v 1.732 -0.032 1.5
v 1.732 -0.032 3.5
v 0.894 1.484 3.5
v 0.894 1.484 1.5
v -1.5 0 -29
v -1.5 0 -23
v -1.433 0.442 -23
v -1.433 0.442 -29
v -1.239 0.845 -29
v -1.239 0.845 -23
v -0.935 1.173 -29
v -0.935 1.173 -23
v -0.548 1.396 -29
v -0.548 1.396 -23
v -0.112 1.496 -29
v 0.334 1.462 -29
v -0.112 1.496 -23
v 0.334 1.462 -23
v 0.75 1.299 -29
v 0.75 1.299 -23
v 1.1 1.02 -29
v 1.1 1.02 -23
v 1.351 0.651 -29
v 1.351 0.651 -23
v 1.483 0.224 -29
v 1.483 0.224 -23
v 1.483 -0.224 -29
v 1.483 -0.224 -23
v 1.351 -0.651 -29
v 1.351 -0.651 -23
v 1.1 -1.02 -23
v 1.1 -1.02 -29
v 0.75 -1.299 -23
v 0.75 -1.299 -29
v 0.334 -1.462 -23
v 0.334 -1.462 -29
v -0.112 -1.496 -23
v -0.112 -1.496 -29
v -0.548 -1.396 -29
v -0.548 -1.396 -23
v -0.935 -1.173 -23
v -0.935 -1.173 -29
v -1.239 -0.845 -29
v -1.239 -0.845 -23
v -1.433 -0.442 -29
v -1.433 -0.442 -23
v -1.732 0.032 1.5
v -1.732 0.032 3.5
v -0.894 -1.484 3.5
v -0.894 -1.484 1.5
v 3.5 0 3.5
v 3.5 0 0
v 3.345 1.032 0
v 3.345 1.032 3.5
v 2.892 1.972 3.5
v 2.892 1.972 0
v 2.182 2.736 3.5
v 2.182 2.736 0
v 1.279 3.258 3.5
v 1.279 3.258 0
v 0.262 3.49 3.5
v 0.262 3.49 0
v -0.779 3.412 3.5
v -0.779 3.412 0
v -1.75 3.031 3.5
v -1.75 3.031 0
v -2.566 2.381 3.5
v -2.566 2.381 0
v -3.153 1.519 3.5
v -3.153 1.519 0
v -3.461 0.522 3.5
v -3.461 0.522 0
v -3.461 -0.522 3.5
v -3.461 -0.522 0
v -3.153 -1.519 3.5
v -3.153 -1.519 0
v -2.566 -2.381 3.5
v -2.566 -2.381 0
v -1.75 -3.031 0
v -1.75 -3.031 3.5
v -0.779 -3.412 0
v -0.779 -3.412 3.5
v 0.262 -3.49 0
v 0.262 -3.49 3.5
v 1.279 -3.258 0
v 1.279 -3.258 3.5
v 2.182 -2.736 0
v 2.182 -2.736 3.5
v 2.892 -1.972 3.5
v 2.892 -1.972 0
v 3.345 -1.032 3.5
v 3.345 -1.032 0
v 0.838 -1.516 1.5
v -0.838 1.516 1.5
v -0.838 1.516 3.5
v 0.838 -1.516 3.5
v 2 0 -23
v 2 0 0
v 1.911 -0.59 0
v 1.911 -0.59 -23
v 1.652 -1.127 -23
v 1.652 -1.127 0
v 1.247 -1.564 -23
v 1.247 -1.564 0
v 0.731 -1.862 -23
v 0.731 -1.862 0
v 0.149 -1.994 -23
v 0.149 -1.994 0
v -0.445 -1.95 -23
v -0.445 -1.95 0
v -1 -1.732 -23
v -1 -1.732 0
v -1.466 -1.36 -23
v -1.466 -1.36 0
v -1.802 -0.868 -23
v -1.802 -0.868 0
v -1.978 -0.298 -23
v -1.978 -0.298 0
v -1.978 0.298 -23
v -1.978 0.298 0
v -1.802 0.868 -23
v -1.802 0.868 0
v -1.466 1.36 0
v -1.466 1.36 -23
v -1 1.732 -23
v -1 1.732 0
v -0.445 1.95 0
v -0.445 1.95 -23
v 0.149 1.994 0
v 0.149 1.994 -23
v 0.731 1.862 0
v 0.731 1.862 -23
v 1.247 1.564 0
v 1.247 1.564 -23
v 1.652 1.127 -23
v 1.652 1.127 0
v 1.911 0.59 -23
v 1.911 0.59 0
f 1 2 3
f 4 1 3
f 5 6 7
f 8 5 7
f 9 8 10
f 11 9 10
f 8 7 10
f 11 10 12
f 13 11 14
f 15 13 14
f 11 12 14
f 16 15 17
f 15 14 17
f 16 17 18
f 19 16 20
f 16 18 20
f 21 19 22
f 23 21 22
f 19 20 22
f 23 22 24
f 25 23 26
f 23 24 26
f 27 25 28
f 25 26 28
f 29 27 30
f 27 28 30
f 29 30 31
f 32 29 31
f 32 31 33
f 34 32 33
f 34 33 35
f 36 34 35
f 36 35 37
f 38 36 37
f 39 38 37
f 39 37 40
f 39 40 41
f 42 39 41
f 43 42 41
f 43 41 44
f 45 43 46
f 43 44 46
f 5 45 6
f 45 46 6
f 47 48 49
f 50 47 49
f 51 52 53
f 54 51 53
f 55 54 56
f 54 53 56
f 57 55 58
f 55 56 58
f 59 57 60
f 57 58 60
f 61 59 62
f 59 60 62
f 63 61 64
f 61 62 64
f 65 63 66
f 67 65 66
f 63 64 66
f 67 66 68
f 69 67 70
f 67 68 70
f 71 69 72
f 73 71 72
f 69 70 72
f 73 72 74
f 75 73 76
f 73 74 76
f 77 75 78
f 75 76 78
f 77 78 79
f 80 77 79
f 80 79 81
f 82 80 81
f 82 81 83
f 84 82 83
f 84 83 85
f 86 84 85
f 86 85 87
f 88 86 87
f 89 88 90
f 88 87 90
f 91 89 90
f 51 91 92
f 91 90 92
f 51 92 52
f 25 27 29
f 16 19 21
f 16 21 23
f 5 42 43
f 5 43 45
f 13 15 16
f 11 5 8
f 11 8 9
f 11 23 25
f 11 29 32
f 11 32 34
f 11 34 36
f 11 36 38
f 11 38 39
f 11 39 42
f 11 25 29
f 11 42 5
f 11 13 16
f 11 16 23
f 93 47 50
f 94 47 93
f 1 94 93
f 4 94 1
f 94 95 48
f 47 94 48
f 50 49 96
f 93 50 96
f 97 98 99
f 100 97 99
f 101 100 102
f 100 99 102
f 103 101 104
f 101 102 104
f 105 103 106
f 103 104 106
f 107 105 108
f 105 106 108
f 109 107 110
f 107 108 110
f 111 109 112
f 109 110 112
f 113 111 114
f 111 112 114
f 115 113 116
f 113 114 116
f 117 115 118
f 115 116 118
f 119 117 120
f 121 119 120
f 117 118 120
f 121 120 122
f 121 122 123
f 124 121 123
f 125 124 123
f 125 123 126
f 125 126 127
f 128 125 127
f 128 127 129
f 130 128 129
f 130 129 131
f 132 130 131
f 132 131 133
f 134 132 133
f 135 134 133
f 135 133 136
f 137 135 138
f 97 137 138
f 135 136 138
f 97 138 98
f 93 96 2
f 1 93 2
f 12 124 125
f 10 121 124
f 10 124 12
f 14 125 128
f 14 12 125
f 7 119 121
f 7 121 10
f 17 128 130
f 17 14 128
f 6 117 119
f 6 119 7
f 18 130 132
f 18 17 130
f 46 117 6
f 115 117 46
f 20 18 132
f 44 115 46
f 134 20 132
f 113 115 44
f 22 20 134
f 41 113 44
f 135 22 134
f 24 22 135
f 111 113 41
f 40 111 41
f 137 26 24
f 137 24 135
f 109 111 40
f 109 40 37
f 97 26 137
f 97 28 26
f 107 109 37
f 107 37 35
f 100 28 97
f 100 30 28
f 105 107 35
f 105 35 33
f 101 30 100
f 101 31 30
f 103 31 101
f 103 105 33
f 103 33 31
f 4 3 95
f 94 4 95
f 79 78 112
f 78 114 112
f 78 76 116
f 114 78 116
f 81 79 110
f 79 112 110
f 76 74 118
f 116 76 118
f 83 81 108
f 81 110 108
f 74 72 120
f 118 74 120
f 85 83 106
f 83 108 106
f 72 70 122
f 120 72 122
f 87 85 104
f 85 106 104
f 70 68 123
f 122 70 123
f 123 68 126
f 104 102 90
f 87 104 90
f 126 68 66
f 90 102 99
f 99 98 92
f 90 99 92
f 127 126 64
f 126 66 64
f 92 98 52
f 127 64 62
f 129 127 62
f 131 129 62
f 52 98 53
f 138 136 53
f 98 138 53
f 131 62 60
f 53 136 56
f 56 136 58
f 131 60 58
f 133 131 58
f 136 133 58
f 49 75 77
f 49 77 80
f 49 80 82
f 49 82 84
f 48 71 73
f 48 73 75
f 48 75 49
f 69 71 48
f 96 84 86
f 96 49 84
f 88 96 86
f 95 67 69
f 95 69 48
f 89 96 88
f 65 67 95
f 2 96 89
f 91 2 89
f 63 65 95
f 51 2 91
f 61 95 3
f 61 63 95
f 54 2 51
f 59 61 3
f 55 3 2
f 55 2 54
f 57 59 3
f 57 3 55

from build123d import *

# Parameters (mm, degrees)
SKETCH_1_R          = 3.5
EXTRUDE_1_DEPTH     = 3.5
CUT_EXTRUDE_1_DEPTH = 2
SKETCH_3_R          = 2
EXTRUDE_2_DEPTH     = 23
SKETCH_4_R          = 1.5
EXTRUDE_3_DEPTH     = 6


with BuildPart() as part:
    # 草图1 → 凸台-拉伸1 (new body)
    with BuildSketch(Plane.XY):
        Circle(SKETCH_1_R)
    extrude(amount=EXTRUDE_1_DEPTH)

    # 草图2 → 切除-拉伸1 (cut)
    with BuildSketch(Plane.XY.offset(3.5)):
        Polygon((0.893639487, 1.483714416), (-0.838114632, 1.515771705), (-1.731754119, 0.03205729), (-0.893639487, -1.483714416), (0.838114632, -1.515771705), (1.731754119, -0.03205729), align=None)
    extrude(amount=-CUT_EXTRUDE_1_DEPTH, mode=Mode.SUBTRACT)

    # 草图3 → 凸台-拉伸2 (add)
    with BuildSketch(Plane(origin=(0, 0, 0), x_dir=(-1, 0, 0), z_dir=(0, 0, -1))):
        with Locations(Location((0, 0, 0), (0, 0, 180))):
            Circle(SKETCH_3_R)
    extrude(amount=EXTRUDE_2_DEPTH)

    # 草图4 → 凸台-拉伸3 (add)
    with BuildSketch(Plane(origin=(0, 0, -23), x_dir=(-1, 0, 0), z_dir=(0, 0, -1))):
        Circle(SKETCH_4_R)
    extrude(amount=EXTRUDE_3_DEPTH)


solid = part.part
